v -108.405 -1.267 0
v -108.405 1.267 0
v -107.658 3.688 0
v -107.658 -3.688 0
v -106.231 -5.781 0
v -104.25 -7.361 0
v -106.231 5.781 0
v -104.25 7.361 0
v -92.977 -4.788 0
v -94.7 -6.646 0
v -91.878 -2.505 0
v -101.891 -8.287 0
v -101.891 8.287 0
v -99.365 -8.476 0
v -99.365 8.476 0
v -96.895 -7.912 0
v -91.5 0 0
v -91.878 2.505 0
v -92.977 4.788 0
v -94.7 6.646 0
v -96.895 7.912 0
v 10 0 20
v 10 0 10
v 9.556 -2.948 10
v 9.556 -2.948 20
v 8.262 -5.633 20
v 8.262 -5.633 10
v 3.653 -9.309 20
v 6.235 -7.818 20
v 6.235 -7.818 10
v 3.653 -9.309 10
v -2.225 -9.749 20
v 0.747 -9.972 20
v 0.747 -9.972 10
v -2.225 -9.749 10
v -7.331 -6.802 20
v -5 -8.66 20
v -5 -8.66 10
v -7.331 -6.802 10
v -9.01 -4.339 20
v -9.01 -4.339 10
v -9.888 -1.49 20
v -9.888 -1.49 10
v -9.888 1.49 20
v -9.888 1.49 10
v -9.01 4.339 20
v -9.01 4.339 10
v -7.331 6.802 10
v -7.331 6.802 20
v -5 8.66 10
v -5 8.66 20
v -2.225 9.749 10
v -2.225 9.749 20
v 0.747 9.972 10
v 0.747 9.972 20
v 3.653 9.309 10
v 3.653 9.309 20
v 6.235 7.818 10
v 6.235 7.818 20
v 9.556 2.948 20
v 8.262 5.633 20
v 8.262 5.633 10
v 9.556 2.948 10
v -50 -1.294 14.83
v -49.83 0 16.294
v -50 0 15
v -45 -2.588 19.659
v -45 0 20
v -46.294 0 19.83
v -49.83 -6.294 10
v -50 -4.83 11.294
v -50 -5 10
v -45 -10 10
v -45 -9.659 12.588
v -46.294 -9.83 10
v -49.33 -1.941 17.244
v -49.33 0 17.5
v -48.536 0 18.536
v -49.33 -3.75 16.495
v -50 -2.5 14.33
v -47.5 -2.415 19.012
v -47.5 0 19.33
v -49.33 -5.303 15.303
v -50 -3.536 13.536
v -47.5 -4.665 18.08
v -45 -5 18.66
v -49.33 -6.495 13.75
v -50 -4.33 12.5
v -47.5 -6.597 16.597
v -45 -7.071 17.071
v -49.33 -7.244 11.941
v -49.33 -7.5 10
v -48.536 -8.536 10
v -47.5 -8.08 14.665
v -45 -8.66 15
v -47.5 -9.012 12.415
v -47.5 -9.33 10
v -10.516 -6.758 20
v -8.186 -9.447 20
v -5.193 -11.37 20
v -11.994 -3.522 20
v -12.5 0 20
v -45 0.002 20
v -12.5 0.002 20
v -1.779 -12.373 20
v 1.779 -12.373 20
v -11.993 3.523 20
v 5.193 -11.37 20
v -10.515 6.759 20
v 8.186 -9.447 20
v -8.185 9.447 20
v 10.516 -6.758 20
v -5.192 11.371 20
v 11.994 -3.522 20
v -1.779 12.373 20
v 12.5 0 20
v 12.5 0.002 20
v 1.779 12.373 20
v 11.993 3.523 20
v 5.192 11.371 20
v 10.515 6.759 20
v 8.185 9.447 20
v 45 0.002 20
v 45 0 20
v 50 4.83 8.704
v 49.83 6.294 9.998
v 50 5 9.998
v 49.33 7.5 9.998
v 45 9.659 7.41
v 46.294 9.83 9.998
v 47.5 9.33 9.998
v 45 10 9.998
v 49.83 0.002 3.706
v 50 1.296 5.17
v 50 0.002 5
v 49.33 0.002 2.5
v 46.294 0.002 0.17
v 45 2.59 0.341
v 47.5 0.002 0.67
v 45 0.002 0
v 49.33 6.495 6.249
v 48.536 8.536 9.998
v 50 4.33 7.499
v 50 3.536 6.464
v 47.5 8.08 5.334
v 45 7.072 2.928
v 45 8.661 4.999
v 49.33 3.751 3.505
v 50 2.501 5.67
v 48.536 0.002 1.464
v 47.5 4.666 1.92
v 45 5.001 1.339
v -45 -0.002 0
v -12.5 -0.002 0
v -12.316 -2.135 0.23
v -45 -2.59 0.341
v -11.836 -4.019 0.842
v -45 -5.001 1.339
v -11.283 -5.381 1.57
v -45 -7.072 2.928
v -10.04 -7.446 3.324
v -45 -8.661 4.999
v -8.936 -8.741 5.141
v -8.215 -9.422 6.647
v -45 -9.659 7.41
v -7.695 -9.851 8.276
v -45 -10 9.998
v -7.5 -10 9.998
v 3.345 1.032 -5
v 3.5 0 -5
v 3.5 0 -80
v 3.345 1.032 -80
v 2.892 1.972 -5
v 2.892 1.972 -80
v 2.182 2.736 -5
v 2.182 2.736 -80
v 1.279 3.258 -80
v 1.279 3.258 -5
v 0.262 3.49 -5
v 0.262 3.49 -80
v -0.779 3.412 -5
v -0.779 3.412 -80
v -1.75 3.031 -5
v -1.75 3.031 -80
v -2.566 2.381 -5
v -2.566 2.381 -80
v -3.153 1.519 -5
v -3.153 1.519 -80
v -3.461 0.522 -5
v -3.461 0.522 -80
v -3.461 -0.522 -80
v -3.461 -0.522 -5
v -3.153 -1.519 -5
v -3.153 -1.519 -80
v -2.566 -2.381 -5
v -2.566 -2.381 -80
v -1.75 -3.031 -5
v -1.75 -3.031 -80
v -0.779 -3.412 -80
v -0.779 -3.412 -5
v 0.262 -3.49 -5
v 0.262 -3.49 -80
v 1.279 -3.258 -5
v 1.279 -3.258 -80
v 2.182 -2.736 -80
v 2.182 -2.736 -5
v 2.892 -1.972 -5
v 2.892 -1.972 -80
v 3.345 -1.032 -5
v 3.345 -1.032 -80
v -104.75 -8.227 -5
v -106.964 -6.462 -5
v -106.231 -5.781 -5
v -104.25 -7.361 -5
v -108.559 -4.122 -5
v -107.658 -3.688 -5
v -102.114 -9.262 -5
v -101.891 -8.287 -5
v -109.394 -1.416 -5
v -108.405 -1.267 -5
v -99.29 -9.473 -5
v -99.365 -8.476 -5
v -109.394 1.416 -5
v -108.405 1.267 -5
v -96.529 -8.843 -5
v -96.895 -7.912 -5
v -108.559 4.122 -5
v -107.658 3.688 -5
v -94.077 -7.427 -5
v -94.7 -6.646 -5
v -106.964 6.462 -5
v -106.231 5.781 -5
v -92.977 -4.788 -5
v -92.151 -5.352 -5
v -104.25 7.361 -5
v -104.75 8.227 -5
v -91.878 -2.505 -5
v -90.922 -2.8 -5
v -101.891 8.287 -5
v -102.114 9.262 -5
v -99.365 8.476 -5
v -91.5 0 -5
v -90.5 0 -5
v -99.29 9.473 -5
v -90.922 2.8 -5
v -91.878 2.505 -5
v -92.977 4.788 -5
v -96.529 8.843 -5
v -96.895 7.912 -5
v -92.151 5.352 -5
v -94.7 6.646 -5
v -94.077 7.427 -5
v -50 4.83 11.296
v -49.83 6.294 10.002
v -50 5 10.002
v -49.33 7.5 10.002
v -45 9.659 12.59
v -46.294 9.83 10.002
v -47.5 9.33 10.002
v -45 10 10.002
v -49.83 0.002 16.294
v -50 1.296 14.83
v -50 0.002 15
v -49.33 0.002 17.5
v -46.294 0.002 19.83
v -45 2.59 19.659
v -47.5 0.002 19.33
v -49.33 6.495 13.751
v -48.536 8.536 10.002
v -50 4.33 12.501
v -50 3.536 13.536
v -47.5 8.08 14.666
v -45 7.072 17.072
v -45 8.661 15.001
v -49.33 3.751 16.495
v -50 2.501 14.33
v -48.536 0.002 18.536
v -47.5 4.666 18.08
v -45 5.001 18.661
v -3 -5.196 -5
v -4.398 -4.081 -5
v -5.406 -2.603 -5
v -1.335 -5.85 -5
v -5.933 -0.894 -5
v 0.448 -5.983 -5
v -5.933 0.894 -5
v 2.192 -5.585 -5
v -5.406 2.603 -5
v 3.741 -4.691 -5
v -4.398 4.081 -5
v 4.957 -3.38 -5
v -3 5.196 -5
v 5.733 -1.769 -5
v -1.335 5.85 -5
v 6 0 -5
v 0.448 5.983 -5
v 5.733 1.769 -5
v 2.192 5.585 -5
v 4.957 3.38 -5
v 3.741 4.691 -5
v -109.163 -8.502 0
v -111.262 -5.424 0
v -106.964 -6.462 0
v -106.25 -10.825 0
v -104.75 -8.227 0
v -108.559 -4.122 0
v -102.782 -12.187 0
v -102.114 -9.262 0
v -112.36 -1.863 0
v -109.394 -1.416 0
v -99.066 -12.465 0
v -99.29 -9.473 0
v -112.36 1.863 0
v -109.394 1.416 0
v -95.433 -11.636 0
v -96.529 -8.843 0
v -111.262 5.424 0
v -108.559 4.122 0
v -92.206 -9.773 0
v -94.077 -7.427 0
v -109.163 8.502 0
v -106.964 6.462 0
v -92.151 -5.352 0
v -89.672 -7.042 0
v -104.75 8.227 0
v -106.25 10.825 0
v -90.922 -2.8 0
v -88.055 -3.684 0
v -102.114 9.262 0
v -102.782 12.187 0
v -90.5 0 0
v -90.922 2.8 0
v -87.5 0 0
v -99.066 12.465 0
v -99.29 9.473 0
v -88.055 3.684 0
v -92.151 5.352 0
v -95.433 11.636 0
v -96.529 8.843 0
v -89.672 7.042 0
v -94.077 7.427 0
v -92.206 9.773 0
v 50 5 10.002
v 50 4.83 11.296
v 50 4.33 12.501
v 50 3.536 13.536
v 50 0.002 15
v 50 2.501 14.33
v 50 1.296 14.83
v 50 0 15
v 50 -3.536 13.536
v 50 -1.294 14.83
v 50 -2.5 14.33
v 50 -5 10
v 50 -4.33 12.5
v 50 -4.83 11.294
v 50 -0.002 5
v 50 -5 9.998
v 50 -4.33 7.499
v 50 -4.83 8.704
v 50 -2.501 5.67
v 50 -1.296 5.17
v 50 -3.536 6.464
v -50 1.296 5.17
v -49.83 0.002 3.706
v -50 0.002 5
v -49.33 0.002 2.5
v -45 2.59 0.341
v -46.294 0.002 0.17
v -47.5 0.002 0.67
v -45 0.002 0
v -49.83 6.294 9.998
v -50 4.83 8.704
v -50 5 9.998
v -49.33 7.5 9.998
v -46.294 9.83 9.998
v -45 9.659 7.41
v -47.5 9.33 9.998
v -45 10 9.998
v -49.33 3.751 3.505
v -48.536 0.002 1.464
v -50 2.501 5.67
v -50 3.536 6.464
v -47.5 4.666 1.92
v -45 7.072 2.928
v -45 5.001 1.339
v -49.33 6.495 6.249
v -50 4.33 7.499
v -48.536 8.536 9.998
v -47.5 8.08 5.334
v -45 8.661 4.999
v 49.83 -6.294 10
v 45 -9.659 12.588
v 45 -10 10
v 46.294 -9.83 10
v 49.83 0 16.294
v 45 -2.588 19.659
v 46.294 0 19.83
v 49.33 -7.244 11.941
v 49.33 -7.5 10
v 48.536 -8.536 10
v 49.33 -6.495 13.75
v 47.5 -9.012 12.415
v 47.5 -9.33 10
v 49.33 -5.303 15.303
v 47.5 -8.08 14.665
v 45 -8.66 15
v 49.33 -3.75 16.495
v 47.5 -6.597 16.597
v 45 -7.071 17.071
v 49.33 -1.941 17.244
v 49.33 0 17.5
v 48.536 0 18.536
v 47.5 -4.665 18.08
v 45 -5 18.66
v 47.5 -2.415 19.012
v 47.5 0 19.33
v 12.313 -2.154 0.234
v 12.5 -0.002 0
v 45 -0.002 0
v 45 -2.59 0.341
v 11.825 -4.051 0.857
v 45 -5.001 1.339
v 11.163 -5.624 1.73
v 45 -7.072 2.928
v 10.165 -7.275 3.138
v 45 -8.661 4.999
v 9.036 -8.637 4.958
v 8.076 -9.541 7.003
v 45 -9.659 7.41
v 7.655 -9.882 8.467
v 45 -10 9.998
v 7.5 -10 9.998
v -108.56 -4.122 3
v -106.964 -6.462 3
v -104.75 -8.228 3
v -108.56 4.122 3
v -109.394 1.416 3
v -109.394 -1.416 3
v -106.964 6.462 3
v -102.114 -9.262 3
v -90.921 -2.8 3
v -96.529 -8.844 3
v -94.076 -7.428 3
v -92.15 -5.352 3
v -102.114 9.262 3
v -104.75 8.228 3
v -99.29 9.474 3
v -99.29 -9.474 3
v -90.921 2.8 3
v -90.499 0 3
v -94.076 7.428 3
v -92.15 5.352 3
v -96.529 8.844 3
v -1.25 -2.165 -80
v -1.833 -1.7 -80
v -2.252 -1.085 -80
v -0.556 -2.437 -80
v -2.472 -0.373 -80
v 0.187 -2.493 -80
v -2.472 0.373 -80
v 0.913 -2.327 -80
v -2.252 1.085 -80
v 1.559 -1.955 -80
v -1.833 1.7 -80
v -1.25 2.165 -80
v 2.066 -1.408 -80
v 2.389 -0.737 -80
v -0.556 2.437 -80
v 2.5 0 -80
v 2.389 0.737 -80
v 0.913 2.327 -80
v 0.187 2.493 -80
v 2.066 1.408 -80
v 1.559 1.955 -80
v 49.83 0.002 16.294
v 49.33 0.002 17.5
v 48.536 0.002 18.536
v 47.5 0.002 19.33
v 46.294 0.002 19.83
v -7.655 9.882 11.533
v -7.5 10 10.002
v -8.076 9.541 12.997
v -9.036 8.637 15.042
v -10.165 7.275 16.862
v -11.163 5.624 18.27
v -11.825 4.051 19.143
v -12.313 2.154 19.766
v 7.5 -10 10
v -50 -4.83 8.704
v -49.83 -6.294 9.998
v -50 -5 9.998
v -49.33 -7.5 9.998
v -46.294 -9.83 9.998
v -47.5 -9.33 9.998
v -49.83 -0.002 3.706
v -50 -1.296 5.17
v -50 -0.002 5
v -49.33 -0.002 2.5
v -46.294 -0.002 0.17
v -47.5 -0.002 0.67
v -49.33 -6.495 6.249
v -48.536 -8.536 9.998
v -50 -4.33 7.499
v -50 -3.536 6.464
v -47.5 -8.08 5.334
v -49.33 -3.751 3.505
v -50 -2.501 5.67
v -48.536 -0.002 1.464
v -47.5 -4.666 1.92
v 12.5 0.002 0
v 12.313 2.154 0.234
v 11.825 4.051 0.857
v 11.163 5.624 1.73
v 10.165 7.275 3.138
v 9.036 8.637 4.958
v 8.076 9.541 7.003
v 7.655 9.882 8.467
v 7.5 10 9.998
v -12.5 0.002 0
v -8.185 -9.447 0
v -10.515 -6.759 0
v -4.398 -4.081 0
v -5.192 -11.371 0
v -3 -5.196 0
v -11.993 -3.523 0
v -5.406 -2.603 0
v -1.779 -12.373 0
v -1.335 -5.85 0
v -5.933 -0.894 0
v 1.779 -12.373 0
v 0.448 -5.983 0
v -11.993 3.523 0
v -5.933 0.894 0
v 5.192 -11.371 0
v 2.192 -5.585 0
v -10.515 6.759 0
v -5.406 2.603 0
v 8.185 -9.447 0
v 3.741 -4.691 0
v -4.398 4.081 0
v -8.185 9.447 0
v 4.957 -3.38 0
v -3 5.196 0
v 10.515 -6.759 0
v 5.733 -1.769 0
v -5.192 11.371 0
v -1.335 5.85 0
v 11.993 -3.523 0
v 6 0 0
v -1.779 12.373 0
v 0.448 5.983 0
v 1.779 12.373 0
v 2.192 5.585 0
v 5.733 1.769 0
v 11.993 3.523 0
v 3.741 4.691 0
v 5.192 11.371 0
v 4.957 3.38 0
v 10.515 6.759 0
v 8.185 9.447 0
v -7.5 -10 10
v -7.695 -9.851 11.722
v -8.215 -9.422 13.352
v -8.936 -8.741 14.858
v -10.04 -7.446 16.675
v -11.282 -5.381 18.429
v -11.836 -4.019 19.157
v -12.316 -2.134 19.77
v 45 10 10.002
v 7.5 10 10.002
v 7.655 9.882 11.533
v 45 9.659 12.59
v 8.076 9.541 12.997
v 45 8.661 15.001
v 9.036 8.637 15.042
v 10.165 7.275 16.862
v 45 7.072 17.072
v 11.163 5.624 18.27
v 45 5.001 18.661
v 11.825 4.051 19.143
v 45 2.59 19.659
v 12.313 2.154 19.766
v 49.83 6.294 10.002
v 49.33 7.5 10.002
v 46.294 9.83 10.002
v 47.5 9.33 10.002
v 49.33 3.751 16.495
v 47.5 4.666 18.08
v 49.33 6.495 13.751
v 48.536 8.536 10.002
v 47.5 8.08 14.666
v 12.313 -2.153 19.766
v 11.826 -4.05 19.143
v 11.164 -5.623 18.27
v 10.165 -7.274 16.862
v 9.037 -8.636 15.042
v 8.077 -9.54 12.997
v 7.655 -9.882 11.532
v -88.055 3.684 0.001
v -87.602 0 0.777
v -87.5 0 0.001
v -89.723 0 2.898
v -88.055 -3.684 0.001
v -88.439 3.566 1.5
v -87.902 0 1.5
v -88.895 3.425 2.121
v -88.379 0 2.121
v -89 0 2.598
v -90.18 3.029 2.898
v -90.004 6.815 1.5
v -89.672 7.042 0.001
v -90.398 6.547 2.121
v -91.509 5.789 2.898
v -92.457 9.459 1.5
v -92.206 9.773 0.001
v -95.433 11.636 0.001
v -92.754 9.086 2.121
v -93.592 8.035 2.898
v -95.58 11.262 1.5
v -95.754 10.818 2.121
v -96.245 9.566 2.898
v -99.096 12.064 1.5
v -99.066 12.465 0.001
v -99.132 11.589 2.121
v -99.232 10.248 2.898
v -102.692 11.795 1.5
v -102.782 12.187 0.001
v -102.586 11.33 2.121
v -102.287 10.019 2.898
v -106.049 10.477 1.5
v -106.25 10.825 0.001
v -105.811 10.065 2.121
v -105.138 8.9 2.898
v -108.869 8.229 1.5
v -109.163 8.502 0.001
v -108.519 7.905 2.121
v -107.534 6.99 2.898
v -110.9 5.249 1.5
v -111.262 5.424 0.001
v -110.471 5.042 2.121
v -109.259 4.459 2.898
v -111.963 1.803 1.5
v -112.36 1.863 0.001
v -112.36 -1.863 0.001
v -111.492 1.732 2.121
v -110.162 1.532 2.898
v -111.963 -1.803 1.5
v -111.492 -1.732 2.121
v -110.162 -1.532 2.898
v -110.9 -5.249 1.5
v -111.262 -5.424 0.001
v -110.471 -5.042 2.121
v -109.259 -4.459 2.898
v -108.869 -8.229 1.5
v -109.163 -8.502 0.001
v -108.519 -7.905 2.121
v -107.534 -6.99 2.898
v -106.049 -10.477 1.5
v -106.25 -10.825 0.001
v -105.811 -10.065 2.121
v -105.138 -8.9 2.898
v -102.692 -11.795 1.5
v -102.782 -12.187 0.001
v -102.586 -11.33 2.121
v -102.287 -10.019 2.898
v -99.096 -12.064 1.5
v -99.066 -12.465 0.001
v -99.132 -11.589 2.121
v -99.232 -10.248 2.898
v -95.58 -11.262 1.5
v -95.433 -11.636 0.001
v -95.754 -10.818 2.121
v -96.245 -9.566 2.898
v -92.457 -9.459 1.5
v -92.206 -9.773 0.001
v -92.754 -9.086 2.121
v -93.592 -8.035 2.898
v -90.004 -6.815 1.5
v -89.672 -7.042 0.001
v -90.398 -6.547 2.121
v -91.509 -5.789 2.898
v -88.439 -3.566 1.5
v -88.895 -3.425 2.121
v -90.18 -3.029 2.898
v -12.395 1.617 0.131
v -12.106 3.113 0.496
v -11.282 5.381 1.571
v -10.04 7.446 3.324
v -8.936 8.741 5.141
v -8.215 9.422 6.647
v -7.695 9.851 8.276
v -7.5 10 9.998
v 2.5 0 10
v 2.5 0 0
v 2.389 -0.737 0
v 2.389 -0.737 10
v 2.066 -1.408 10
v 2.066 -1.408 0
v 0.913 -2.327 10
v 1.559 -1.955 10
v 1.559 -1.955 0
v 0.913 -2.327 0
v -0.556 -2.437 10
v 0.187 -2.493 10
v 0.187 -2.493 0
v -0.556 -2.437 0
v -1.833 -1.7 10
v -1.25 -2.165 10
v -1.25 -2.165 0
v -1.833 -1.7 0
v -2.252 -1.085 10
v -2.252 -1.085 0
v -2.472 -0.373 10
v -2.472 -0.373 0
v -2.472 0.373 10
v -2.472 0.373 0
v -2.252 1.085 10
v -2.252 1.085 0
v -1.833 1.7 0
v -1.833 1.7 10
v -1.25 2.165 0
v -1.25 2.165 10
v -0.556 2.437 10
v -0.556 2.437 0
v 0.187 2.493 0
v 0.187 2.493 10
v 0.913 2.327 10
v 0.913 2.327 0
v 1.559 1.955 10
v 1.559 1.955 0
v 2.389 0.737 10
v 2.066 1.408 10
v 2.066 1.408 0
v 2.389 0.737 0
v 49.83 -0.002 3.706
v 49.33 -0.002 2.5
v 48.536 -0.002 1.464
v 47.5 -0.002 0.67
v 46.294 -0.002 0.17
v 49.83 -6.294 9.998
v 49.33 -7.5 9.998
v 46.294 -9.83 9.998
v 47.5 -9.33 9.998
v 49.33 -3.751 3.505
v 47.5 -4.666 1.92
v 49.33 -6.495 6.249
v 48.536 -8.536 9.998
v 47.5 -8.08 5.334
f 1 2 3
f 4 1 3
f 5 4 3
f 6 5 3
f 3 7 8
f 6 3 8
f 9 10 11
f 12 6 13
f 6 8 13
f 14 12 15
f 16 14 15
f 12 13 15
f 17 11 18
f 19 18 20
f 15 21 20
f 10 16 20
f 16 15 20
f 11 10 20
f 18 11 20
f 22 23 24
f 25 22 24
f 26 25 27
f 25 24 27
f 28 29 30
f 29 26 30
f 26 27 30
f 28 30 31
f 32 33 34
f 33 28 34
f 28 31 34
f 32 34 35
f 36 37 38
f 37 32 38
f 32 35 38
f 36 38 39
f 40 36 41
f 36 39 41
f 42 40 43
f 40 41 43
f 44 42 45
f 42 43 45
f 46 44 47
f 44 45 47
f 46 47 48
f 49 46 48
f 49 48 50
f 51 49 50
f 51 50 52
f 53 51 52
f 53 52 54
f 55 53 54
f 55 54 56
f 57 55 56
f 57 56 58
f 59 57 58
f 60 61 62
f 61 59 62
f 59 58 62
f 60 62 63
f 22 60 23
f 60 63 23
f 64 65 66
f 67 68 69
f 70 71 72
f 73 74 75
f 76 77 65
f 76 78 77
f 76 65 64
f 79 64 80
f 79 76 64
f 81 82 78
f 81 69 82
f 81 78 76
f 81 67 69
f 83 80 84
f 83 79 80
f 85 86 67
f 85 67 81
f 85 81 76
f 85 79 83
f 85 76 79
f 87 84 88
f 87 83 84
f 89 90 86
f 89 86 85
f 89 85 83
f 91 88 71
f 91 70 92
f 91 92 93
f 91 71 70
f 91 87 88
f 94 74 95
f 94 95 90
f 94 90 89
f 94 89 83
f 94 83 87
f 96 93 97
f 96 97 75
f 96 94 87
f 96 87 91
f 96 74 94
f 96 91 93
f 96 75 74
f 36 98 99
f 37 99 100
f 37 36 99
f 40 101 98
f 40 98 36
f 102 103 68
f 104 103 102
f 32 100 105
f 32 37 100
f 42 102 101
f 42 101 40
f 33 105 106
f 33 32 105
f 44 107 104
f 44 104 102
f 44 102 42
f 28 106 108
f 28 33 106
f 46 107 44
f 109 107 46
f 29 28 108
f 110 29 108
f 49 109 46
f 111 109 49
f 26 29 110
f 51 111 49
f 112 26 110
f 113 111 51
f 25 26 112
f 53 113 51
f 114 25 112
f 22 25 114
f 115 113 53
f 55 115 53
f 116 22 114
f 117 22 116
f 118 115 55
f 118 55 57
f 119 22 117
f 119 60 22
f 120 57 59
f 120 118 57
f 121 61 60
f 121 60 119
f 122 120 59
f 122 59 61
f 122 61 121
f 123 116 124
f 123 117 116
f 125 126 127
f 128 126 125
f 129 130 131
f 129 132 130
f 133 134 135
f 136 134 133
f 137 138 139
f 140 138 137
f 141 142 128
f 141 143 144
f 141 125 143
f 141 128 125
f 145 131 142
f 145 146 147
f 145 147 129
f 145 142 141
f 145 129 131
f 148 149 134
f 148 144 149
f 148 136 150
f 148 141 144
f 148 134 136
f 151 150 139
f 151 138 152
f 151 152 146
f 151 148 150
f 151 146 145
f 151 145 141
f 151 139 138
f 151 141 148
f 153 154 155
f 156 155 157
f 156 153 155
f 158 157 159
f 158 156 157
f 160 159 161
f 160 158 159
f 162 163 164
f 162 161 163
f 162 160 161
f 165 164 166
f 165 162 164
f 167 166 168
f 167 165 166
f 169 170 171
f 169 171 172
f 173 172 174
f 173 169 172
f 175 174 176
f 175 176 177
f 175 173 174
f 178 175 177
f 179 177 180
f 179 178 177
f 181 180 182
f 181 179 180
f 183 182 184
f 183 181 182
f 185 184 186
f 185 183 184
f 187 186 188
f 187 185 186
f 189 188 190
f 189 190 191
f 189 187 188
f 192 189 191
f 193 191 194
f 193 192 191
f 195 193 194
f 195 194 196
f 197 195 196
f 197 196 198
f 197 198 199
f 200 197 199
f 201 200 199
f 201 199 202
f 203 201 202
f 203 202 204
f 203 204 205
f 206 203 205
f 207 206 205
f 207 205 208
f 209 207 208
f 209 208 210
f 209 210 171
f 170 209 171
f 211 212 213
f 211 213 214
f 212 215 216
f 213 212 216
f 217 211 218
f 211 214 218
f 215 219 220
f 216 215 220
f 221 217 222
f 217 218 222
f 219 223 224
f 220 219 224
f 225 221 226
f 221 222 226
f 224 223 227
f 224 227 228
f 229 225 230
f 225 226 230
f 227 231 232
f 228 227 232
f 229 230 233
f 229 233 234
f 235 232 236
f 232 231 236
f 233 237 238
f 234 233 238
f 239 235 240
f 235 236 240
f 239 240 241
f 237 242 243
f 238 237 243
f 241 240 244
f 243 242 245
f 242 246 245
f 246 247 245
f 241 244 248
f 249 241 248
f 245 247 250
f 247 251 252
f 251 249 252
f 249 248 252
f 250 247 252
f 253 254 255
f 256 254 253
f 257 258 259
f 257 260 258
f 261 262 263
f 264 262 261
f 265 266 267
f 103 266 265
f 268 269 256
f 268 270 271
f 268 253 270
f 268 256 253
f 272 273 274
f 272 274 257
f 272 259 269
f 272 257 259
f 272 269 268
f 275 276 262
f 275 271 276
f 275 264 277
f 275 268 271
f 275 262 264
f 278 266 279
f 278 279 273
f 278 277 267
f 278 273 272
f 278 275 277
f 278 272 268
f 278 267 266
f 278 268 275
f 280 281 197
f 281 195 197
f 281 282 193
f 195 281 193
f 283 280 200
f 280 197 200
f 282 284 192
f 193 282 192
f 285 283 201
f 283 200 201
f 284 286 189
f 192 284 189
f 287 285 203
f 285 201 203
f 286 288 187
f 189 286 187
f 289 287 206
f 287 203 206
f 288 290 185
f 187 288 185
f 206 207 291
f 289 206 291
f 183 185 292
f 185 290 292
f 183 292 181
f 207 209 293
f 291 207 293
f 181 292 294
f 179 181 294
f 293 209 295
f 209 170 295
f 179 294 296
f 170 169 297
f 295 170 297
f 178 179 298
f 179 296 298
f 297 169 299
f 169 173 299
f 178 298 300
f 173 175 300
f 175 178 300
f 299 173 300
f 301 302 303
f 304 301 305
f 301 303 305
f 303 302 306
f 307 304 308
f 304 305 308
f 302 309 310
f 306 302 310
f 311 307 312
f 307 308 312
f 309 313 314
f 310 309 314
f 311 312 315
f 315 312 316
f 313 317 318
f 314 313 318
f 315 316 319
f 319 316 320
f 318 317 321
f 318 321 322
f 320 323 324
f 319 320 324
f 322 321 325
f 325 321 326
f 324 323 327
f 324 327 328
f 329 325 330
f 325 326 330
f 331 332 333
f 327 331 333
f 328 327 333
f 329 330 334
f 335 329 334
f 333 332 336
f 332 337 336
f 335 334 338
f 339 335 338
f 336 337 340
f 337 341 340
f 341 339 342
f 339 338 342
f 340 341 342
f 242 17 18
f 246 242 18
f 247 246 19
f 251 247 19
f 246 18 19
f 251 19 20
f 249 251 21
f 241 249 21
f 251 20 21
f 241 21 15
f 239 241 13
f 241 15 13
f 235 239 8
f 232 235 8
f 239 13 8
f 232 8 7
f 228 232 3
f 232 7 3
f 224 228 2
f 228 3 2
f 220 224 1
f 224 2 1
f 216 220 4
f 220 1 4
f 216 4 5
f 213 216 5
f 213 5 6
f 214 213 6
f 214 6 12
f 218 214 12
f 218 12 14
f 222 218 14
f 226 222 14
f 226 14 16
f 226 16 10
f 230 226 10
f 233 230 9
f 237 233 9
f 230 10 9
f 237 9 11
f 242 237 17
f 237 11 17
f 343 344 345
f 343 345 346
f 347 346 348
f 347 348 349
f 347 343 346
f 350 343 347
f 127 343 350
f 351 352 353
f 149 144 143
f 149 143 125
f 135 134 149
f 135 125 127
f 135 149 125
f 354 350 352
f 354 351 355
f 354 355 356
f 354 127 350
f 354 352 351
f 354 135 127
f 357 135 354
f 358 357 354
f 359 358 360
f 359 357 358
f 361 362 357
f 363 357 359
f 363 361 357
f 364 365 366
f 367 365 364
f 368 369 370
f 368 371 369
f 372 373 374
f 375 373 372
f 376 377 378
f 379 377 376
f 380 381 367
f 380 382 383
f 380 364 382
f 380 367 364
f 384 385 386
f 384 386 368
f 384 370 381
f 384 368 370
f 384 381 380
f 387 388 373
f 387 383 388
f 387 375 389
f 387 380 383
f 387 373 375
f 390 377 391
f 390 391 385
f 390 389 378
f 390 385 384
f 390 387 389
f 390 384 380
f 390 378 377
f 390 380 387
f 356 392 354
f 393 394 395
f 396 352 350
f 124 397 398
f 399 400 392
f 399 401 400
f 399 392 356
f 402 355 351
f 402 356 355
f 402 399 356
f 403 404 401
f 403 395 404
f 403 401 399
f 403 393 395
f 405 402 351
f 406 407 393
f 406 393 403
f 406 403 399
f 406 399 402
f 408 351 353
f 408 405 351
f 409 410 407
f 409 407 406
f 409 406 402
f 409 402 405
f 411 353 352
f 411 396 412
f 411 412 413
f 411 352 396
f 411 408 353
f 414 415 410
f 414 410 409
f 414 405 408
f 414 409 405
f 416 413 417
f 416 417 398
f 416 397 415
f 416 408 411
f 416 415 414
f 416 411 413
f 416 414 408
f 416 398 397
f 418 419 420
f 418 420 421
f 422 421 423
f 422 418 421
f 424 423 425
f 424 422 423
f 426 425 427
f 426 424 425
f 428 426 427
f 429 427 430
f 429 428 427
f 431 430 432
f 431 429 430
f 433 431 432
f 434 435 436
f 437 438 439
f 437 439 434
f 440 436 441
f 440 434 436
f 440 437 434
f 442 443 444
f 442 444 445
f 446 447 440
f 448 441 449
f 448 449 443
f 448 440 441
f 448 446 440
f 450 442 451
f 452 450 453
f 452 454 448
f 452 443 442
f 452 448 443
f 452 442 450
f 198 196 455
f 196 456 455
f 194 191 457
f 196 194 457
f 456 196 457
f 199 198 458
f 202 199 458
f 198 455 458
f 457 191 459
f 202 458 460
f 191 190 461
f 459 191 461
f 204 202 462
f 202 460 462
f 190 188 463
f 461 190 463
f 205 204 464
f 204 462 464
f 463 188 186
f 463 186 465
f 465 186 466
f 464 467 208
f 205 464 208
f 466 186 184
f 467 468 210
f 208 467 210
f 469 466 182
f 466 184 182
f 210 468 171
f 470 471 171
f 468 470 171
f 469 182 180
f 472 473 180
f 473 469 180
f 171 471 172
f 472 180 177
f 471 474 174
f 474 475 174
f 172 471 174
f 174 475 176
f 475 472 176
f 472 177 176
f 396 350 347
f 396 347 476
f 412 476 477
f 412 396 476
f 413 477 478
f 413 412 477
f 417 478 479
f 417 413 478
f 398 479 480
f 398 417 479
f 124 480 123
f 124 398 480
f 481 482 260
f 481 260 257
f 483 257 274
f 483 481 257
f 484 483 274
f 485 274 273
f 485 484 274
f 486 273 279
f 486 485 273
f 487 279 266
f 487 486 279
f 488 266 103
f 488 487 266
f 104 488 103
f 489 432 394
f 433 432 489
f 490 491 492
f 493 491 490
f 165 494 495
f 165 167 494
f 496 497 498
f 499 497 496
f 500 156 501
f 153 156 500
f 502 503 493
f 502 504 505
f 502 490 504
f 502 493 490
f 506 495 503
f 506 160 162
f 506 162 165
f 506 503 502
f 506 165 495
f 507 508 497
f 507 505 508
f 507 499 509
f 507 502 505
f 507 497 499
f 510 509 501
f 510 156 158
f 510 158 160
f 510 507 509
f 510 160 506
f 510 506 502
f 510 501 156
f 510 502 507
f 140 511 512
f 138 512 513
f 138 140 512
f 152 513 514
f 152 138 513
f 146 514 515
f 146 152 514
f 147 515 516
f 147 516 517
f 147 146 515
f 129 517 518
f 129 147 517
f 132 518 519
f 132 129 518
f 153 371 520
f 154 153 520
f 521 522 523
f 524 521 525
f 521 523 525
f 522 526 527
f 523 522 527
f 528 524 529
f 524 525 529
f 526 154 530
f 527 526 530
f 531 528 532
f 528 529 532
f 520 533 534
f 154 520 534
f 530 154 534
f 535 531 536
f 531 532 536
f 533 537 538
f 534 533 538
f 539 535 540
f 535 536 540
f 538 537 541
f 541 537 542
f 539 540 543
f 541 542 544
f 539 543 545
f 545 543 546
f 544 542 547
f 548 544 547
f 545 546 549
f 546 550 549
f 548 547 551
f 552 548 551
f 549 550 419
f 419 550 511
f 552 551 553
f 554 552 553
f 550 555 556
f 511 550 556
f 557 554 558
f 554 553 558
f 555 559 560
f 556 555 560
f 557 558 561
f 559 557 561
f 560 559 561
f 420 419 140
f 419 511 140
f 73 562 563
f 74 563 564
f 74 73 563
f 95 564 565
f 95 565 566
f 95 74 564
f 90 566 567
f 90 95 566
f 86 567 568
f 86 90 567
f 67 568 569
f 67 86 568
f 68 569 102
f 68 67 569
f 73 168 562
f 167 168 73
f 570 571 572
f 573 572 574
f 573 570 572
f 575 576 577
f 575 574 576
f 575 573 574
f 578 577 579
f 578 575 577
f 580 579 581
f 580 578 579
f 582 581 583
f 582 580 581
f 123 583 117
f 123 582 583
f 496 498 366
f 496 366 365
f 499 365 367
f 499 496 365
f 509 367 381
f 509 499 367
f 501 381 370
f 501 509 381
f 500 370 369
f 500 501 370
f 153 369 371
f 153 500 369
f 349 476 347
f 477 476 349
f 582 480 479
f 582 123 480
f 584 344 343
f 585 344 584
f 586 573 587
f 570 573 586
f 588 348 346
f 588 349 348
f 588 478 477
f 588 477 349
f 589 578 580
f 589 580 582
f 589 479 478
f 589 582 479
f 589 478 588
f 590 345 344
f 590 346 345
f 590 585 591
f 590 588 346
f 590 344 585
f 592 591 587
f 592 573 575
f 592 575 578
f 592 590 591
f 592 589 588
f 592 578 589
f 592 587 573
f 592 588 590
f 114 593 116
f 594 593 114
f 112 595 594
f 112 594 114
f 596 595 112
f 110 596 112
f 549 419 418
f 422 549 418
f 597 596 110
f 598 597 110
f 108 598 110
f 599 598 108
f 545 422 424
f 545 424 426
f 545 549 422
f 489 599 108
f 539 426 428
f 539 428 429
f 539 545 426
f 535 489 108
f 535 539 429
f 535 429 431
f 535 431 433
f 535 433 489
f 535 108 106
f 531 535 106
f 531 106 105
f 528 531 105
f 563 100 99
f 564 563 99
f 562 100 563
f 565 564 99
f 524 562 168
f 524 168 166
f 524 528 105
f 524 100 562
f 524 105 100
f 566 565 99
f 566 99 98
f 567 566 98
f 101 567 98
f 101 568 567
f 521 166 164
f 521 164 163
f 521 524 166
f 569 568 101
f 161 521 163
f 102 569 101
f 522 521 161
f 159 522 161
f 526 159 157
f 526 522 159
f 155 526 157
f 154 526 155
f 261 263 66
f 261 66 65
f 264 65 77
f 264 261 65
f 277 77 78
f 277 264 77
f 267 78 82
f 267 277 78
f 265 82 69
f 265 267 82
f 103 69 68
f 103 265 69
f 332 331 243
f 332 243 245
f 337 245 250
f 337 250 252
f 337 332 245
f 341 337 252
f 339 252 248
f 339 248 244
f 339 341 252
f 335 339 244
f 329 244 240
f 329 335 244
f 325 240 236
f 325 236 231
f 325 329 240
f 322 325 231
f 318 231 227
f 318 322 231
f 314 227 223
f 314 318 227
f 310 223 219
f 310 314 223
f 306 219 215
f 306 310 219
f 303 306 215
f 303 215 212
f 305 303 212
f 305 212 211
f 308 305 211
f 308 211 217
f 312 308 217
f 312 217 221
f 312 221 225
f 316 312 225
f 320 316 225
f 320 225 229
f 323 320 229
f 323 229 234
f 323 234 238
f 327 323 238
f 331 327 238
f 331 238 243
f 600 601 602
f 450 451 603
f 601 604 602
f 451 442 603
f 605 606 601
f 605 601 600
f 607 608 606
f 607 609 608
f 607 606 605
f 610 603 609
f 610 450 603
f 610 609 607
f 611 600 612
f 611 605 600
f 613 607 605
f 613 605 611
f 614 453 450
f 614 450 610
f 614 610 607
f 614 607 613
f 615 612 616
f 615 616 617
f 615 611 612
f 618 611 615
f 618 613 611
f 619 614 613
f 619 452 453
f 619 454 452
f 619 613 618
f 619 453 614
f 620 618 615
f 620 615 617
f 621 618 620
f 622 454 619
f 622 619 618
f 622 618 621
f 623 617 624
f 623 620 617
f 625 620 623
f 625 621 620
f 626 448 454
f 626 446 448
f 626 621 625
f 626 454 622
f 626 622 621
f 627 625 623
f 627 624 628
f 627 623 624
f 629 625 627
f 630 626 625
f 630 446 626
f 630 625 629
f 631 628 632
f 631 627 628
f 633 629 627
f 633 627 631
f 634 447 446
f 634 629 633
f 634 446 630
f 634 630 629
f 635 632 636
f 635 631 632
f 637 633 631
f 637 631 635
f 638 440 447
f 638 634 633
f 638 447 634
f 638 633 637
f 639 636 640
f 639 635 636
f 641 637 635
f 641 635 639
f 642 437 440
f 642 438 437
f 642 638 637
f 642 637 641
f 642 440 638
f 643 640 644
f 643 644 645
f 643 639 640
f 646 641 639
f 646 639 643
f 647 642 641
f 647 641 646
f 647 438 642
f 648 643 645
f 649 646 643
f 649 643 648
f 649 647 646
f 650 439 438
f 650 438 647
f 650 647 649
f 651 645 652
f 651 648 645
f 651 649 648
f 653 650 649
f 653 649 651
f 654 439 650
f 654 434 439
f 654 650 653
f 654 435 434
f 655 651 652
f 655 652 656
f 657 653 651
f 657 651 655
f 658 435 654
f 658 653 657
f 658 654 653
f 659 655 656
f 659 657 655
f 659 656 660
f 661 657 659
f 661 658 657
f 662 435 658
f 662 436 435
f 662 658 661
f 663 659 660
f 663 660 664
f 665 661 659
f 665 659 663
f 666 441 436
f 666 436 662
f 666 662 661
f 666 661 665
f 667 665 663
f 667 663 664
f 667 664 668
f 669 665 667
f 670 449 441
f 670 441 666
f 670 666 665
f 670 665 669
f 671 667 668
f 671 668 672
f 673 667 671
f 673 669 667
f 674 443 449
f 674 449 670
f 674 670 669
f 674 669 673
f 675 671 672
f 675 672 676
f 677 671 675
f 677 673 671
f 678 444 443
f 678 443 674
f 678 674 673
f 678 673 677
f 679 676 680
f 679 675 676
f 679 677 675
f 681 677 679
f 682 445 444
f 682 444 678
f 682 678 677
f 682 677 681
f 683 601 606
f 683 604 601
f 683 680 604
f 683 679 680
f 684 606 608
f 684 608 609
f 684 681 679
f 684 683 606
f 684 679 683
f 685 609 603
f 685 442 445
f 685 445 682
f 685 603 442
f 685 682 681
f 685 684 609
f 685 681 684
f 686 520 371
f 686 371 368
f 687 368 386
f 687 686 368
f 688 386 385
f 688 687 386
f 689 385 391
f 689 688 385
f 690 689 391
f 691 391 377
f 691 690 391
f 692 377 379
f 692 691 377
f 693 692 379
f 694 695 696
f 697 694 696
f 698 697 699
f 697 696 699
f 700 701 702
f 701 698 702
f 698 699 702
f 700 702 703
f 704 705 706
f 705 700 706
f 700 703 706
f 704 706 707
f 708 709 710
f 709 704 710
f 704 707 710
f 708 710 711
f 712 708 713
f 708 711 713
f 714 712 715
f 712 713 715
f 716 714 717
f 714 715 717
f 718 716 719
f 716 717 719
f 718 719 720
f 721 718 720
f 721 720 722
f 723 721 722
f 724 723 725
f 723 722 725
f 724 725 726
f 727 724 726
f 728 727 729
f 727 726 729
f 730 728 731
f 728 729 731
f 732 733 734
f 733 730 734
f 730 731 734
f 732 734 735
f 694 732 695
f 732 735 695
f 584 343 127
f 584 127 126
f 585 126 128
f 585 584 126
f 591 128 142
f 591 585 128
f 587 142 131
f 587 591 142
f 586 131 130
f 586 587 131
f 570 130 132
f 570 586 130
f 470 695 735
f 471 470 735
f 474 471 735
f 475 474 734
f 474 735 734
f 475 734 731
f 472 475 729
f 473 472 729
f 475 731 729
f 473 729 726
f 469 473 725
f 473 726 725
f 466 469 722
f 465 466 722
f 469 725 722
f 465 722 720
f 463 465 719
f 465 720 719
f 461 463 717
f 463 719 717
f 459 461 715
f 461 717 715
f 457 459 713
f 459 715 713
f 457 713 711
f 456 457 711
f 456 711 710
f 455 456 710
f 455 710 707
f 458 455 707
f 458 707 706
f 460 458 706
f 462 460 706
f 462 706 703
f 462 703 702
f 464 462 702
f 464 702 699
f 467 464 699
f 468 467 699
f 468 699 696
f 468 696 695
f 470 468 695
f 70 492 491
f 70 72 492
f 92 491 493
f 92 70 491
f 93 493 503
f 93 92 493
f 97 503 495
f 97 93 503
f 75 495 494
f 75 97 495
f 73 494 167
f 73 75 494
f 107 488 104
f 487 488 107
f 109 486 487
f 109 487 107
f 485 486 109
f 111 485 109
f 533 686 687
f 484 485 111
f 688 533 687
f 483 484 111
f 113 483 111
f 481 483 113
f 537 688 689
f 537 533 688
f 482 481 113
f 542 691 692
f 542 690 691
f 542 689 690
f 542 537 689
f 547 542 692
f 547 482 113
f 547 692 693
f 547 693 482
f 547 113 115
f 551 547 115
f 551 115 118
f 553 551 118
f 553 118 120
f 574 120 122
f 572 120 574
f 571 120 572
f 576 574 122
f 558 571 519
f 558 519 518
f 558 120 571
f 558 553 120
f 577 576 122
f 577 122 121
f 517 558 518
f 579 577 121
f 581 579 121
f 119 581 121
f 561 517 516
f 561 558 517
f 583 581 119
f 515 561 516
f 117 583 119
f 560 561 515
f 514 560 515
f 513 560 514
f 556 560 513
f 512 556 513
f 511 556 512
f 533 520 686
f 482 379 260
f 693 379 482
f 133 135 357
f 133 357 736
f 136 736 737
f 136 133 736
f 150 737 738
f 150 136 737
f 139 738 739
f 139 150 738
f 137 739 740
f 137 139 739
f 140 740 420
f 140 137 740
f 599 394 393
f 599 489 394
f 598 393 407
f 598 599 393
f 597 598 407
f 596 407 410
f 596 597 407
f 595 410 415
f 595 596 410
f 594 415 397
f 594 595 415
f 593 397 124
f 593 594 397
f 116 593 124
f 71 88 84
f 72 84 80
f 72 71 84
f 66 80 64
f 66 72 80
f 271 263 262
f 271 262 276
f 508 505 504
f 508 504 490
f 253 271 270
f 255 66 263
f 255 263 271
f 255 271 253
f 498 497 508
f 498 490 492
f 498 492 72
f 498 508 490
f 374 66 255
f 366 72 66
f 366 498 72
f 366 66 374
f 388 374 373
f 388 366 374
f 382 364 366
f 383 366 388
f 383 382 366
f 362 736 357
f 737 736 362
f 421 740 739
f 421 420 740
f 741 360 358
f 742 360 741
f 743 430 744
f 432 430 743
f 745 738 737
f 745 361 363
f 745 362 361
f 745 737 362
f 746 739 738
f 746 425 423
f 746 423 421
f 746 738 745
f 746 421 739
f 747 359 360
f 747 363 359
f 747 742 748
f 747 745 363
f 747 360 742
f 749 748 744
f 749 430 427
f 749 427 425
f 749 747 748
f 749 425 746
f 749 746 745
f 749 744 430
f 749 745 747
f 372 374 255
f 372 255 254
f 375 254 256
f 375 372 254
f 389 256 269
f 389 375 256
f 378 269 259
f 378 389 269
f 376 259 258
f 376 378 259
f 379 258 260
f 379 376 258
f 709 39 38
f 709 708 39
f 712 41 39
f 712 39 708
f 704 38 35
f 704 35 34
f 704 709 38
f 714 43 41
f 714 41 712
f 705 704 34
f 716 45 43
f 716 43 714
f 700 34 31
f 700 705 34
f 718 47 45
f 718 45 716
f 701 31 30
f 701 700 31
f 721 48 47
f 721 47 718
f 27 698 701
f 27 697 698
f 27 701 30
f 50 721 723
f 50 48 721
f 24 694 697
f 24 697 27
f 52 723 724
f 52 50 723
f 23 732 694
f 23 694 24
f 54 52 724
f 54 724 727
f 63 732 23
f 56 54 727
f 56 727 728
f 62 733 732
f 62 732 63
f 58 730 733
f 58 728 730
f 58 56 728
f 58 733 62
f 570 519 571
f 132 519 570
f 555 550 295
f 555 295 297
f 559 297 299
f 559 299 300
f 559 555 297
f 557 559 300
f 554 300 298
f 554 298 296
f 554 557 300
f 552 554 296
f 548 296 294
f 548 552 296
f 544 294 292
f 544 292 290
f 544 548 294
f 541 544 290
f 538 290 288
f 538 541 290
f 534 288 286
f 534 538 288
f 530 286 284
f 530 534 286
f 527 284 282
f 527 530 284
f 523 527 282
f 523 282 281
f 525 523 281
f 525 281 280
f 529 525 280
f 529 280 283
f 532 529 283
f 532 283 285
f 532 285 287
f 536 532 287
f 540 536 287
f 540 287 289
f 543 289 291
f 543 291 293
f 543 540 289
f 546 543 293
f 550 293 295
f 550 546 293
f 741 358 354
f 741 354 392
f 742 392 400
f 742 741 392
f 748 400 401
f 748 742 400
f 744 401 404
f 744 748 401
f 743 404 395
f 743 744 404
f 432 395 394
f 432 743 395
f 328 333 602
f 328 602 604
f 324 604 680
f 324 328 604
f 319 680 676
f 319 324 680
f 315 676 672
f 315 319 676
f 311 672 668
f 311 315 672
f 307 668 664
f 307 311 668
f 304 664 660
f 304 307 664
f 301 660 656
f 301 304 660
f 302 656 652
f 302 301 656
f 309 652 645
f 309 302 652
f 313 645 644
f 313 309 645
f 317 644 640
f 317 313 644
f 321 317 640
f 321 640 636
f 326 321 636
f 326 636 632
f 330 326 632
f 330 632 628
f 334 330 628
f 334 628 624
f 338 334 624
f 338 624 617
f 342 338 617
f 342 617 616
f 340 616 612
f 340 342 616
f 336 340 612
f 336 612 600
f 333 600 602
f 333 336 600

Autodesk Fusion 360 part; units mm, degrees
sketch "Sketch1" plane through (0, 0, 0) normal (0, 0, 1) x (1, 0, 0)
  circle A0 centre (0, 0) radius 2.5
  circle A1 centre (0, 0) radius 3.5
  circle A2 centre (0, 0) radius 10
  circle A3 centre (0, 0) radius 12.5
  line L0 (50, -10) -> (-50, -10)
  line L1 (-50, -10) -> (-50, 10)
  line L2 (-50, 10) -> (50, 10)
  line L3 (50, 10) -> (50, -10)
  line L4 (50, -10) -> (-50, 10) construction
  line L5 (-50, -10) -> (50, 10) construction
  circle A4 centre (0, 0) radius 6
  dimension "d1" = 5
  dimension "d2" = 7
  dimension "d3" = 20
  dimension "d4" = 25
  dimension "d5" = 100
  dimension "d36" = 12
extrude "Extrude6" add sketch "Sketch1" against normal blind 5 contours A4 makes body 1
extrude "Extrude2" add sketch "Sketch1" along normal blind 10 separate body contours A1 | A2 | A4 makes body 2
extrude "Extrude3" add sketch "Sketch1" along normal blind 20 contours A2 A3 L0 L2 | A2 A3 L0 L2 | A3 L2 | A3 L0 | A3 L0 L1 L2 | A3 L0 L2 L3 bodies 2
extrude "Extrude1" add sketch "Sketch1" against normal blind 80 separate body contours A1 makes body 3
fillet "Fillet1" radius 10 1 edges at (-28.75, -10, 20) on bodies 2
fillet "Fillet2" radius 10 1 edges at (28.75, -10, 20) on bodies 2
fillet "Fillet3" radius 10 1 edges at (28.75, 10, 20) on bodies 2
fillet "Fillet4" radius 10 1 edges at (-28.75, 10, 20) on bodies 2
fillet "Fillet5" radius 10 4 edges at (-28.75, -10, 0) (28.75, -10, 0) (28.75, 10, 0) (-28.75, 10, 0) on bodies 2
fillet "Fillet6" radius 5 2 edges at (50, -10, 10) (50, 10, 10) on bodies 2
fillet "Fillet7" radius 5 2 edges at (-50, -10, 10) (-50, 10, 10) on bodies 2
sketch "Sketch2" plane through (0, 0, 0) normal (0, 0, 1) x (1, 0, 0)
  circle A0 centre (-100, 0) radius 8.5
  circle A1 centre (-100, 0) radius 9.5
  circle A2 centre (-100, 0) radius 12.5
  dimension "d26" = 17
  dimension "d27" = 19
  dimension "d28" = 25
extrude "Extrude5" add sketch "Sketch2" along normal blind 3 separate body contours A0 | A1 | A2 makes body 4
extrude "Extrude4" add sketch "Sketch2" against normal blind 5 separate body contours A1 makes body 5
combine "Combine1" operation add target body 4 tool bodies 5
fillet "Fillet8" radius 3 1 edges at (-111.6541, -4.5202, 3) on bodies 4
combine "Combine2" operation add target body 2 tool bodies 1 3
